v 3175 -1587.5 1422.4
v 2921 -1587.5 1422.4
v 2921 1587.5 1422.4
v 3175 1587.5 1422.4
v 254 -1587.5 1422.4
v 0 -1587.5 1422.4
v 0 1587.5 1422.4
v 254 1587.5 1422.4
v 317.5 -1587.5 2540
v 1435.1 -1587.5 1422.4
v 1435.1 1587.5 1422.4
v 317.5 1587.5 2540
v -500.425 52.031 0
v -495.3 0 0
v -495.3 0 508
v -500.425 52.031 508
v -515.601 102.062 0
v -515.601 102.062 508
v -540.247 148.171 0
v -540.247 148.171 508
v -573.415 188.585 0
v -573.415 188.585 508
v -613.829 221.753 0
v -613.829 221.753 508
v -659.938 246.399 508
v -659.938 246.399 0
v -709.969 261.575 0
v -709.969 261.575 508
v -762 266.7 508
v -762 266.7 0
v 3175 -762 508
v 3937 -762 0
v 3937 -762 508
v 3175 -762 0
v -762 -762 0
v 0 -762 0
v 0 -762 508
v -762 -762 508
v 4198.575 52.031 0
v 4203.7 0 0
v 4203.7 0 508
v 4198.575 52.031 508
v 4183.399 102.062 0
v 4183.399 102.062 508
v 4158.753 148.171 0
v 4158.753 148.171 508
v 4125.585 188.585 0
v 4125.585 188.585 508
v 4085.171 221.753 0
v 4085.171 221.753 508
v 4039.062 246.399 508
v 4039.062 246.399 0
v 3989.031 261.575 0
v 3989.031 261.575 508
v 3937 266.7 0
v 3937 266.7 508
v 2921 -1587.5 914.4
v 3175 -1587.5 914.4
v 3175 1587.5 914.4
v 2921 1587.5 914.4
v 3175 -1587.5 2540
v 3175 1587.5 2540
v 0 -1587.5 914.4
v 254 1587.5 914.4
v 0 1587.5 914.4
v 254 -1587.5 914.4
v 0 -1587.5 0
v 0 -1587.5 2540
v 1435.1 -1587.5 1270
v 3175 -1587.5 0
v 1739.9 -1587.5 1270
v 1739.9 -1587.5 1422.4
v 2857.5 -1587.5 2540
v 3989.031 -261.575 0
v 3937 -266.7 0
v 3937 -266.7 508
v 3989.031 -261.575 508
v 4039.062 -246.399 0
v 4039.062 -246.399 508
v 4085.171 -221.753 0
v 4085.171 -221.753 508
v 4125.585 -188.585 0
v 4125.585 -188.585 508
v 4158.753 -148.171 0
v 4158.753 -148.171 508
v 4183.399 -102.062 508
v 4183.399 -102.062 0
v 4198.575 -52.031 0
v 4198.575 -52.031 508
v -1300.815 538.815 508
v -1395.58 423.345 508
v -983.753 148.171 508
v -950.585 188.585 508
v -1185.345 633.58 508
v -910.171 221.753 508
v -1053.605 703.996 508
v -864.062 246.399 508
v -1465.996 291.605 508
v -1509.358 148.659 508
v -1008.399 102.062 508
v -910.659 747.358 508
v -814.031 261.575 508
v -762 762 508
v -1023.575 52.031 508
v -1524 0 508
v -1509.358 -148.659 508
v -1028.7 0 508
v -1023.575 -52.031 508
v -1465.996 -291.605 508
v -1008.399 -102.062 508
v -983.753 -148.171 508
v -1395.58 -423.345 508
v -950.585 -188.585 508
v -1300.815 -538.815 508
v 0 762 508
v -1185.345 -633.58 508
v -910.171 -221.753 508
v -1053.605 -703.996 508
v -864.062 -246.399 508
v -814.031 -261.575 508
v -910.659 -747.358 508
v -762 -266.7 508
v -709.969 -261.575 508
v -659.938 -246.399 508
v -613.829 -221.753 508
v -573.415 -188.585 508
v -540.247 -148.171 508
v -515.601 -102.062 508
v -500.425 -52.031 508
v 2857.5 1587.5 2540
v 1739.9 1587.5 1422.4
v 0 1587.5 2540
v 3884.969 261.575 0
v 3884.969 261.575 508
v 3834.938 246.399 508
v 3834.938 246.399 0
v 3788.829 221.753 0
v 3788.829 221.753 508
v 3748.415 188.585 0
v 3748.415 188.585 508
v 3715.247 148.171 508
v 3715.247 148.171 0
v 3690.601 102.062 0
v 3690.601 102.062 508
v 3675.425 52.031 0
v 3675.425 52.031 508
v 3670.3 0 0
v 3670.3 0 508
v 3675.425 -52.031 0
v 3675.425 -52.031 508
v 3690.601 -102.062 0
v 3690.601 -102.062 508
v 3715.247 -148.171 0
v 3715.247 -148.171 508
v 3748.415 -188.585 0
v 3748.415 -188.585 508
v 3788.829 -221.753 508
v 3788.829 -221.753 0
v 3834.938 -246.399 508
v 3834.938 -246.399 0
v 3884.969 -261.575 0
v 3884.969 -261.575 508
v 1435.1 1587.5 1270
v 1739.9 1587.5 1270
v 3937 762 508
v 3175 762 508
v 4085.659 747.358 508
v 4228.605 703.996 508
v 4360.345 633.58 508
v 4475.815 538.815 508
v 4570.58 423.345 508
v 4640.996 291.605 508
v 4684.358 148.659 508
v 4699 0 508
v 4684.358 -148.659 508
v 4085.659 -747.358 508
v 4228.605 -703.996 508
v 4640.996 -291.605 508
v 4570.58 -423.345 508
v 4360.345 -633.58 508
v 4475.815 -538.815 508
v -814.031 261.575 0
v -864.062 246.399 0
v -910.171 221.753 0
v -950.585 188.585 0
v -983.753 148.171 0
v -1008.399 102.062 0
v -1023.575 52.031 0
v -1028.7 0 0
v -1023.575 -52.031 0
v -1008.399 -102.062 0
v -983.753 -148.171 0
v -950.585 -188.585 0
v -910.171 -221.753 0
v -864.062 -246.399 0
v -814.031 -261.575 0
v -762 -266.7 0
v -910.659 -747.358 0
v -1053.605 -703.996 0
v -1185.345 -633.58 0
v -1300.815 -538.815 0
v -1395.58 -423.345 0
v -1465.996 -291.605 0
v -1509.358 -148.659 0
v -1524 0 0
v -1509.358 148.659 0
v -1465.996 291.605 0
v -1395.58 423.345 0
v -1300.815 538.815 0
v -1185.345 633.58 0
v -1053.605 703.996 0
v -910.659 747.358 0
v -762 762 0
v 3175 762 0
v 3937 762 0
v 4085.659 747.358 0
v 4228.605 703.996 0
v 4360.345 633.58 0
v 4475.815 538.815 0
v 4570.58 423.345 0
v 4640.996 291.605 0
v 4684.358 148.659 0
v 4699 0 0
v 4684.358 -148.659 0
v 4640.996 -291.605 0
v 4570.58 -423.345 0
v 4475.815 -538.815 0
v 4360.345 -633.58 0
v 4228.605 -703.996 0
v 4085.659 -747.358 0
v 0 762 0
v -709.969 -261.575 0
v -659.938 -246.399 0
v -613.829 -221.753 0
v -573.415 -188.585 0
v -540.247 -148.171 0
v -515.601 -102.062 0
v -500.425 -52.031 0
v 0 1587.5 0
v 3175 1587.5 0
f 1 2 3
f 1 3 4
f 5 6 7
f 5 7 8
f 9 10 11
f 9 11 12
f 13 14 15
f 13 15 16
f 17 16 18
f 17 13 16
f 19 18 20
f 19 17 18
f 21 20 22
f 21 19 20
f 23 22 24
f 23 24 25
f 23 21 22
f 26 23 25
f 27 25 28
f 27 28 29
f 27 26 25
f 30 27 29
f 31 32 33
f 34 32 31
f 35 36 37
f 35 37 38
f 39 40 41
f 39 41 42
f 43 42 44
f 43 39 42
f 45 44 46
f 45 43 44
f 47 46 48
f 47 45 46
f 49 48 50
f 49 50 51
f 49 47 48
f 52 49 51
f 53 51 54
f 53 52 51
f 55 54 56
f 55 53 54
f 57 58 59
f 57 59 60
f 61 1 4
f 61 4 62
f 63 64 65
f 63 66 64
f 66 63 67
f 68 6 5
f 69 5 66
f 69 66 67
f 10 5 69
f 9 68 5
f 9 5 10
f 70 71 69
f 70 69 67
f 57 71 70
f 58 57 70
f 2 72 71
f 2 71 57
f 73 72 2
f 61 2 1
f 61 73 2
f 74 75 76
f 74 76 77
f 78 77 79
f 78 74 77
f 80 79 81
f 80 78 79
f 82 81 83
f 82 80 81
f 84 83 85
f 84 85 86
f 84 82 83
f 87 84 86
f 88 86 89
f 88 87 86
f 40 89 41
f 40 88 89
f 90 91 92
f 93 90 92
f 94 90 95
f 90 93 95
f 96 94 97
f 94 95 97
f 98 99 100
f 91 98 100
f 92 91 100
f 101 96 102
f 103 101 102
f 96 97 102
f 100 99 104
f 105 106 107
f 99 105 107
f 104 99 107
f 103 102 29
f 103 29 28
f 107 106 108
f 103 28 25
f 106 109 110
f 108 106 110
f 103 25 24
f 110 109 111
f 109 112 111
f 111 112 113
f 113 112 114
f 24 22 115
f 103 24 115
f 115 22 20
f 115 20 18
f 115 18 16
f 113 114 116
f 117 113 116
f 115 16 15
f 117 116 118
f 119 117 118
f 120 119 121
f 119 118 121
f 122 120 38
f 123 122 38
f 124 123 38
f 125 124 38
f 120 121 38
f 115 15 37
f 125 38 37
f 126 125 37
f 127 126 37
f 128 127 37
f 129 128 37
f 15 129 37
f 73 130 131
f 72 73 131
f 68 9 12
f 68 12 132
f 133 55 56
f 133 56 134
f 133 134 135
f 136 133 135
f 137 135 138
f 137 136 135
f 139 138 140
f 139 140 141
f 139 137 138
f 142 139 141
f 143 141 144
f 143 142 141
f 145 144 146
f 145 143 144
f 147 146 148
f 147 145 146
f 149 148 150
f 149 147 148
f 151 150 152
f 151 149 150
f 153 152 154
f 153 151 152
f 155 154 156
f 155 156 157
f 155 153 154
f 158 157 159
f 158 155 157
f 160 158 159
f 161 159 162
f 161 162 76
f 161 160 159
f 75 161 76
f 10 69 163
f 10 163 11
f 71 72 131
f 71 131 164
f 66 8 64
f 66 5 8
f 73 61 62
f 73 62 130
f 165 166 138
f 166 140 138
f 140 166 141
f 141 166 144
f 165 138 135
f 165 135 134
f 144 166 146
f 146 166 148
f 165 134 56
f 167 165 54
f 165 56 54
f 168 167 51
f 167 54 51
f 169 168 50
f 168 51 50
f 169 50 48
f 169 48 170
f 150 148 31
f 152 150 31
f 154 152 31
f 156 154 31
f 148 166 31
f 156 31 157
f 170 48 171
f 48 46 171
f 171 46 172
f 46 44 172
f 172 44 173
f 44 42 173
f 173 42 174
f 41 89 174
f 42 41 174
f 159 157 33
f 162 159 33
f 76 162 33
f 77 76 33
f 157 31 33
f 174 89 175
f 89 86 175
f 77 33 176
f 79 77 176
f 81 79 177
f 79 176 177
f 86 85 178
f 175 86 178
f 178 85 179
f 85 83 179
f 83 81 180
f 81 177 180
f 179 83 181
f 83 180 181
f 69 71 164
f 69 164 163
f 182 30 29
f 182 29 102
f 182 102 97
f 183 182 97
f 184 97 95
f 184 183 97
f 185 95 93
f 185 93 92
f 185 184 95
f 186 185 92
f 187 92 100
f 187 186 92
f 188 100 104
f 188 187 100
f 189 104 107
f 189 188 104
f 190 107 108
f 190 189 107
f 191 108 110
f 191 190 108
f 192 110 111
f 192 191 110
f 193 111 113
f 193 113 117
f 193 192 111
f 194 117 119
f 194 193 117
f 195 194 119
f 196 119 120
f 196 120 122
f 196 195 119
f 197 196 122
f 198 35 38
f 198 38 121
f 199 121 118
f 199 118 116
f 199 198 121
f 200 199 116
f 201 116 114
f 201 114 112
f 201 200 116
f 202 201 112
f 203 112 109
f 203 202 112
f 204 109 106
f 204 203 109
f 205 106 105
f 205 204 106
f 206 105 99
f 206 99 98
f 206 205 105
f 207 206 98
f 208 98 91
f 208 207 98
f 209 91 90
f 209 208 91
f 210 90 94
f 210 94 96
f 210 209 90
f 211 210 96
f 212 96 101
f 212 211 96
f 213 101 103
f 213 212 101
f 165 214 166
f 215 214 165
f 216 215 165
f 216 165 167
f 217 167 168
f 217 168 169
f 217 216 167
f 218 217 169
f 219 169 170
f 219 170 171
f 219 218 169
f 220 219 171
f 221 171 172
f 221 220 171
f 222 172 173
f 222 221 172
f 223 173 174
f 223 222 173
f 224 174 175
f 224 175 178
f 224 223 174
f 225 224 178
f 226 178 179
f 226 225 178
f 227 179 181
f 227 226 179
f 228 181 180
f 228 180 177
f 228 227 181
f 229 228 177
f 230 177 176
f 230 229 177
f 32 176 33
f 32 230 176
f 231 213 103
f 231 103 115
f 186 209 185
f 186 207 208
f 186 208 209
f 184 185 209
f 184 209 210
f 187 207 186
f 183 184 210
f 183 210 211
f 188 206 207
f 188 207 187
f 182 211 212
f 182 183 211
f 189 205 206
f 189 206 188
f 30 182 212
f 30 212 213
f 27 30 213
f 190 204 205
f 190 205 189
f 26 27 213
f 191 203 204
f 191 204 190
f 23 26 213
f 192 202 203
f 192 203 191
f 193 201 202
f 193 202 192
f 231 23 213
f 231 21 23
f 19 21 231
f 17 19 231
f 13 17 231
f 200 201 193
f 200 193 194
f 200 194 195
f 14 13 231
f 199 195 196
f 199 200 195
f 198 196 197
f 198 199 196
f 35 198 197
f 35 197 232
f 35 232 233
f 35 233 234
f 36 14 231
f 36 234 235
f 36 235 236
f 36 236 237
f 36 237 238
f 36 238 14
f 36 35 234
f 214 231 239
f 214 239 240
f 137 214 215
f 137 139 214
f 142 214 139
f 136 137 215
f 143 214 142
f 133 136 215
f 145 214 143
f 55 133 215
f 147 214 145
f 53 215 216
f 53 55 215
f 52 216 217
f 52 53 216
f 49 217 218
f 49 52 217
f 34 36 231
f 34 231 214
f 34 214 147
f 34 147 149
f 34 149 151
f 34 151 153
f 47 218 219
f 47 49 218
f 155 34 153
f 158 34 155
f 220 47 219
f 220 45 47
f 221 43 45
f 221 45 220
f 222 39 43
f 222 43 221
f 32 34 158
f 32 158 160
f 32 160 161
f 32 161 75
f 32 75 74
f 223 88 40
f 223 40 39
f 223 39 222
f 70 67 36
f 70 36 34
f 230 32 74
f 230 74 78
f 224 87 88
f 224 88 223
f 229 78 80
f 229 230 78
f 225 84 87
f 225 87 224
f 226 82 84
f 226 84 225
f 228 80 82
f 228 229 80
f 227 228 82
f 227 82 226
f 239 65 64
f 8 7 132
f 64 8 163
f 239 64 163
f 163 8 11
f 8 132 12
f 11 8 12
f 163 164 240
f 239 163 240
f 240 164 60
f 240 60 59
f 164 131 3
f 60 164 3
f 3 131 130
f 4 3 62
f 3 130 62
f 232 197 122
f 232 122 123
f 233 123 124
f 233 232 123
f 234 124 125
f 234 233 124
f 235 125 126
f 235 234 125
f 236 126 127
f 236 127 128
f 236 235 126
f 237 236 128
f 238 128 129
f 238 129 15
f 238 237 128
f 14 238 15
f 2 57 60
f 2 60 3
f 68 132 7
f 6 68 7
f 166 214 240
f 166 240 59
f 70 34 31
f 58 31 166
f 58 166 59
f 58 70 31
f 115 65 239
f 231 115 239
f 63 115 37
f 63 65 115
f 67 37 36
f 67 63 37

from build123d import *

# Parameters (mm, degrees)
F1_DEPTH = 1587.5
F3_DEPTH = 508


with BuildPart() as f1:
    # F0 (on Front) → F1 (new body, symmetric)
    with BuildSketch(Plane.XZ):
        Polygon((0, 914.4), (0, 0), (3175, 0), (3175, 914.4), (2921, 914.4), (2921, 1422.4), (3175, 1422.4), (3175, 2540), (2857.5, 2540), (1739.9, 1422.4), (1739.9, 1270), (1587.5, 1270), (1435.1, 1270), (1435.1, 1422.4), (317.5, 2540), (0, 2540), (0, 1422.4), (254, 1422.4), (254, 914.4), align=None)
    extrude(amount=F1_DEPTH, both=True)

    # F2 (on face) → F3 (join)
    with BuildSketch(Plane(origin=(0, 0, 0), x_dir=(1, 0, 0), z_dir=(0, 0, -1))):
        with BuildLine():
            Line((-762, 266.7), (-762, 762))
            ThreePointArc((-762, 762), (-1524, 0), (-762, -762))
            Line((-762, -762), (-762, -266.7))
            ThreePointArc((-762, -266.7), (-1028.7, 0), (-762, 266.7))
        make_face()
        with BuildLine():
            Line((0, -762), (0, 0))
            Line((0, 0), (0, 762))
            Line((0, 762), (-762, 762))
            Line((-762, 762), (-762, 266.7))
            ThreePointArc((-762, 266.7), (-573.414621, 188.585379), (-495.3, 0))
            ThreePointArc((-495.3, 0), (-573.414621, -188.585379), (-762, -266.7))
            Line((-762, -266.7), (-762, -762))
            Line((-762, -762), (0, -762))
        make_face()
        with BuildLine():
            Line((3937, 762), (3175, 762))
            Line((3175, 762), (3175, -762))
            Line((3175, -762), (3937, -762))
            Line((3937, -762), (3937, -266.7))
            ThreePointArc((3937, -266.7), (3670.3, 0), (3937, 266.7))
            Line((3937, 266.7), (3937, 762))
        make_face()
        with BuildLine():
            ThreePointArc((3937, -762), (4699, 0), (3937, 762))
            Line((3937, 762), (3937, 266.7))
            ThreePointArc((3937, 266.7), (4125.585379, 188.585379), (4203.7, 0))
            ThreePointArc((4203.7, 0), (4125.585379, -188.585379), (3937, -266.7))
            Line((3937, -266.7), (3937, -762))
        make_face()
    extrude(amount=-F3_DEPTH)


solid = f1.part
